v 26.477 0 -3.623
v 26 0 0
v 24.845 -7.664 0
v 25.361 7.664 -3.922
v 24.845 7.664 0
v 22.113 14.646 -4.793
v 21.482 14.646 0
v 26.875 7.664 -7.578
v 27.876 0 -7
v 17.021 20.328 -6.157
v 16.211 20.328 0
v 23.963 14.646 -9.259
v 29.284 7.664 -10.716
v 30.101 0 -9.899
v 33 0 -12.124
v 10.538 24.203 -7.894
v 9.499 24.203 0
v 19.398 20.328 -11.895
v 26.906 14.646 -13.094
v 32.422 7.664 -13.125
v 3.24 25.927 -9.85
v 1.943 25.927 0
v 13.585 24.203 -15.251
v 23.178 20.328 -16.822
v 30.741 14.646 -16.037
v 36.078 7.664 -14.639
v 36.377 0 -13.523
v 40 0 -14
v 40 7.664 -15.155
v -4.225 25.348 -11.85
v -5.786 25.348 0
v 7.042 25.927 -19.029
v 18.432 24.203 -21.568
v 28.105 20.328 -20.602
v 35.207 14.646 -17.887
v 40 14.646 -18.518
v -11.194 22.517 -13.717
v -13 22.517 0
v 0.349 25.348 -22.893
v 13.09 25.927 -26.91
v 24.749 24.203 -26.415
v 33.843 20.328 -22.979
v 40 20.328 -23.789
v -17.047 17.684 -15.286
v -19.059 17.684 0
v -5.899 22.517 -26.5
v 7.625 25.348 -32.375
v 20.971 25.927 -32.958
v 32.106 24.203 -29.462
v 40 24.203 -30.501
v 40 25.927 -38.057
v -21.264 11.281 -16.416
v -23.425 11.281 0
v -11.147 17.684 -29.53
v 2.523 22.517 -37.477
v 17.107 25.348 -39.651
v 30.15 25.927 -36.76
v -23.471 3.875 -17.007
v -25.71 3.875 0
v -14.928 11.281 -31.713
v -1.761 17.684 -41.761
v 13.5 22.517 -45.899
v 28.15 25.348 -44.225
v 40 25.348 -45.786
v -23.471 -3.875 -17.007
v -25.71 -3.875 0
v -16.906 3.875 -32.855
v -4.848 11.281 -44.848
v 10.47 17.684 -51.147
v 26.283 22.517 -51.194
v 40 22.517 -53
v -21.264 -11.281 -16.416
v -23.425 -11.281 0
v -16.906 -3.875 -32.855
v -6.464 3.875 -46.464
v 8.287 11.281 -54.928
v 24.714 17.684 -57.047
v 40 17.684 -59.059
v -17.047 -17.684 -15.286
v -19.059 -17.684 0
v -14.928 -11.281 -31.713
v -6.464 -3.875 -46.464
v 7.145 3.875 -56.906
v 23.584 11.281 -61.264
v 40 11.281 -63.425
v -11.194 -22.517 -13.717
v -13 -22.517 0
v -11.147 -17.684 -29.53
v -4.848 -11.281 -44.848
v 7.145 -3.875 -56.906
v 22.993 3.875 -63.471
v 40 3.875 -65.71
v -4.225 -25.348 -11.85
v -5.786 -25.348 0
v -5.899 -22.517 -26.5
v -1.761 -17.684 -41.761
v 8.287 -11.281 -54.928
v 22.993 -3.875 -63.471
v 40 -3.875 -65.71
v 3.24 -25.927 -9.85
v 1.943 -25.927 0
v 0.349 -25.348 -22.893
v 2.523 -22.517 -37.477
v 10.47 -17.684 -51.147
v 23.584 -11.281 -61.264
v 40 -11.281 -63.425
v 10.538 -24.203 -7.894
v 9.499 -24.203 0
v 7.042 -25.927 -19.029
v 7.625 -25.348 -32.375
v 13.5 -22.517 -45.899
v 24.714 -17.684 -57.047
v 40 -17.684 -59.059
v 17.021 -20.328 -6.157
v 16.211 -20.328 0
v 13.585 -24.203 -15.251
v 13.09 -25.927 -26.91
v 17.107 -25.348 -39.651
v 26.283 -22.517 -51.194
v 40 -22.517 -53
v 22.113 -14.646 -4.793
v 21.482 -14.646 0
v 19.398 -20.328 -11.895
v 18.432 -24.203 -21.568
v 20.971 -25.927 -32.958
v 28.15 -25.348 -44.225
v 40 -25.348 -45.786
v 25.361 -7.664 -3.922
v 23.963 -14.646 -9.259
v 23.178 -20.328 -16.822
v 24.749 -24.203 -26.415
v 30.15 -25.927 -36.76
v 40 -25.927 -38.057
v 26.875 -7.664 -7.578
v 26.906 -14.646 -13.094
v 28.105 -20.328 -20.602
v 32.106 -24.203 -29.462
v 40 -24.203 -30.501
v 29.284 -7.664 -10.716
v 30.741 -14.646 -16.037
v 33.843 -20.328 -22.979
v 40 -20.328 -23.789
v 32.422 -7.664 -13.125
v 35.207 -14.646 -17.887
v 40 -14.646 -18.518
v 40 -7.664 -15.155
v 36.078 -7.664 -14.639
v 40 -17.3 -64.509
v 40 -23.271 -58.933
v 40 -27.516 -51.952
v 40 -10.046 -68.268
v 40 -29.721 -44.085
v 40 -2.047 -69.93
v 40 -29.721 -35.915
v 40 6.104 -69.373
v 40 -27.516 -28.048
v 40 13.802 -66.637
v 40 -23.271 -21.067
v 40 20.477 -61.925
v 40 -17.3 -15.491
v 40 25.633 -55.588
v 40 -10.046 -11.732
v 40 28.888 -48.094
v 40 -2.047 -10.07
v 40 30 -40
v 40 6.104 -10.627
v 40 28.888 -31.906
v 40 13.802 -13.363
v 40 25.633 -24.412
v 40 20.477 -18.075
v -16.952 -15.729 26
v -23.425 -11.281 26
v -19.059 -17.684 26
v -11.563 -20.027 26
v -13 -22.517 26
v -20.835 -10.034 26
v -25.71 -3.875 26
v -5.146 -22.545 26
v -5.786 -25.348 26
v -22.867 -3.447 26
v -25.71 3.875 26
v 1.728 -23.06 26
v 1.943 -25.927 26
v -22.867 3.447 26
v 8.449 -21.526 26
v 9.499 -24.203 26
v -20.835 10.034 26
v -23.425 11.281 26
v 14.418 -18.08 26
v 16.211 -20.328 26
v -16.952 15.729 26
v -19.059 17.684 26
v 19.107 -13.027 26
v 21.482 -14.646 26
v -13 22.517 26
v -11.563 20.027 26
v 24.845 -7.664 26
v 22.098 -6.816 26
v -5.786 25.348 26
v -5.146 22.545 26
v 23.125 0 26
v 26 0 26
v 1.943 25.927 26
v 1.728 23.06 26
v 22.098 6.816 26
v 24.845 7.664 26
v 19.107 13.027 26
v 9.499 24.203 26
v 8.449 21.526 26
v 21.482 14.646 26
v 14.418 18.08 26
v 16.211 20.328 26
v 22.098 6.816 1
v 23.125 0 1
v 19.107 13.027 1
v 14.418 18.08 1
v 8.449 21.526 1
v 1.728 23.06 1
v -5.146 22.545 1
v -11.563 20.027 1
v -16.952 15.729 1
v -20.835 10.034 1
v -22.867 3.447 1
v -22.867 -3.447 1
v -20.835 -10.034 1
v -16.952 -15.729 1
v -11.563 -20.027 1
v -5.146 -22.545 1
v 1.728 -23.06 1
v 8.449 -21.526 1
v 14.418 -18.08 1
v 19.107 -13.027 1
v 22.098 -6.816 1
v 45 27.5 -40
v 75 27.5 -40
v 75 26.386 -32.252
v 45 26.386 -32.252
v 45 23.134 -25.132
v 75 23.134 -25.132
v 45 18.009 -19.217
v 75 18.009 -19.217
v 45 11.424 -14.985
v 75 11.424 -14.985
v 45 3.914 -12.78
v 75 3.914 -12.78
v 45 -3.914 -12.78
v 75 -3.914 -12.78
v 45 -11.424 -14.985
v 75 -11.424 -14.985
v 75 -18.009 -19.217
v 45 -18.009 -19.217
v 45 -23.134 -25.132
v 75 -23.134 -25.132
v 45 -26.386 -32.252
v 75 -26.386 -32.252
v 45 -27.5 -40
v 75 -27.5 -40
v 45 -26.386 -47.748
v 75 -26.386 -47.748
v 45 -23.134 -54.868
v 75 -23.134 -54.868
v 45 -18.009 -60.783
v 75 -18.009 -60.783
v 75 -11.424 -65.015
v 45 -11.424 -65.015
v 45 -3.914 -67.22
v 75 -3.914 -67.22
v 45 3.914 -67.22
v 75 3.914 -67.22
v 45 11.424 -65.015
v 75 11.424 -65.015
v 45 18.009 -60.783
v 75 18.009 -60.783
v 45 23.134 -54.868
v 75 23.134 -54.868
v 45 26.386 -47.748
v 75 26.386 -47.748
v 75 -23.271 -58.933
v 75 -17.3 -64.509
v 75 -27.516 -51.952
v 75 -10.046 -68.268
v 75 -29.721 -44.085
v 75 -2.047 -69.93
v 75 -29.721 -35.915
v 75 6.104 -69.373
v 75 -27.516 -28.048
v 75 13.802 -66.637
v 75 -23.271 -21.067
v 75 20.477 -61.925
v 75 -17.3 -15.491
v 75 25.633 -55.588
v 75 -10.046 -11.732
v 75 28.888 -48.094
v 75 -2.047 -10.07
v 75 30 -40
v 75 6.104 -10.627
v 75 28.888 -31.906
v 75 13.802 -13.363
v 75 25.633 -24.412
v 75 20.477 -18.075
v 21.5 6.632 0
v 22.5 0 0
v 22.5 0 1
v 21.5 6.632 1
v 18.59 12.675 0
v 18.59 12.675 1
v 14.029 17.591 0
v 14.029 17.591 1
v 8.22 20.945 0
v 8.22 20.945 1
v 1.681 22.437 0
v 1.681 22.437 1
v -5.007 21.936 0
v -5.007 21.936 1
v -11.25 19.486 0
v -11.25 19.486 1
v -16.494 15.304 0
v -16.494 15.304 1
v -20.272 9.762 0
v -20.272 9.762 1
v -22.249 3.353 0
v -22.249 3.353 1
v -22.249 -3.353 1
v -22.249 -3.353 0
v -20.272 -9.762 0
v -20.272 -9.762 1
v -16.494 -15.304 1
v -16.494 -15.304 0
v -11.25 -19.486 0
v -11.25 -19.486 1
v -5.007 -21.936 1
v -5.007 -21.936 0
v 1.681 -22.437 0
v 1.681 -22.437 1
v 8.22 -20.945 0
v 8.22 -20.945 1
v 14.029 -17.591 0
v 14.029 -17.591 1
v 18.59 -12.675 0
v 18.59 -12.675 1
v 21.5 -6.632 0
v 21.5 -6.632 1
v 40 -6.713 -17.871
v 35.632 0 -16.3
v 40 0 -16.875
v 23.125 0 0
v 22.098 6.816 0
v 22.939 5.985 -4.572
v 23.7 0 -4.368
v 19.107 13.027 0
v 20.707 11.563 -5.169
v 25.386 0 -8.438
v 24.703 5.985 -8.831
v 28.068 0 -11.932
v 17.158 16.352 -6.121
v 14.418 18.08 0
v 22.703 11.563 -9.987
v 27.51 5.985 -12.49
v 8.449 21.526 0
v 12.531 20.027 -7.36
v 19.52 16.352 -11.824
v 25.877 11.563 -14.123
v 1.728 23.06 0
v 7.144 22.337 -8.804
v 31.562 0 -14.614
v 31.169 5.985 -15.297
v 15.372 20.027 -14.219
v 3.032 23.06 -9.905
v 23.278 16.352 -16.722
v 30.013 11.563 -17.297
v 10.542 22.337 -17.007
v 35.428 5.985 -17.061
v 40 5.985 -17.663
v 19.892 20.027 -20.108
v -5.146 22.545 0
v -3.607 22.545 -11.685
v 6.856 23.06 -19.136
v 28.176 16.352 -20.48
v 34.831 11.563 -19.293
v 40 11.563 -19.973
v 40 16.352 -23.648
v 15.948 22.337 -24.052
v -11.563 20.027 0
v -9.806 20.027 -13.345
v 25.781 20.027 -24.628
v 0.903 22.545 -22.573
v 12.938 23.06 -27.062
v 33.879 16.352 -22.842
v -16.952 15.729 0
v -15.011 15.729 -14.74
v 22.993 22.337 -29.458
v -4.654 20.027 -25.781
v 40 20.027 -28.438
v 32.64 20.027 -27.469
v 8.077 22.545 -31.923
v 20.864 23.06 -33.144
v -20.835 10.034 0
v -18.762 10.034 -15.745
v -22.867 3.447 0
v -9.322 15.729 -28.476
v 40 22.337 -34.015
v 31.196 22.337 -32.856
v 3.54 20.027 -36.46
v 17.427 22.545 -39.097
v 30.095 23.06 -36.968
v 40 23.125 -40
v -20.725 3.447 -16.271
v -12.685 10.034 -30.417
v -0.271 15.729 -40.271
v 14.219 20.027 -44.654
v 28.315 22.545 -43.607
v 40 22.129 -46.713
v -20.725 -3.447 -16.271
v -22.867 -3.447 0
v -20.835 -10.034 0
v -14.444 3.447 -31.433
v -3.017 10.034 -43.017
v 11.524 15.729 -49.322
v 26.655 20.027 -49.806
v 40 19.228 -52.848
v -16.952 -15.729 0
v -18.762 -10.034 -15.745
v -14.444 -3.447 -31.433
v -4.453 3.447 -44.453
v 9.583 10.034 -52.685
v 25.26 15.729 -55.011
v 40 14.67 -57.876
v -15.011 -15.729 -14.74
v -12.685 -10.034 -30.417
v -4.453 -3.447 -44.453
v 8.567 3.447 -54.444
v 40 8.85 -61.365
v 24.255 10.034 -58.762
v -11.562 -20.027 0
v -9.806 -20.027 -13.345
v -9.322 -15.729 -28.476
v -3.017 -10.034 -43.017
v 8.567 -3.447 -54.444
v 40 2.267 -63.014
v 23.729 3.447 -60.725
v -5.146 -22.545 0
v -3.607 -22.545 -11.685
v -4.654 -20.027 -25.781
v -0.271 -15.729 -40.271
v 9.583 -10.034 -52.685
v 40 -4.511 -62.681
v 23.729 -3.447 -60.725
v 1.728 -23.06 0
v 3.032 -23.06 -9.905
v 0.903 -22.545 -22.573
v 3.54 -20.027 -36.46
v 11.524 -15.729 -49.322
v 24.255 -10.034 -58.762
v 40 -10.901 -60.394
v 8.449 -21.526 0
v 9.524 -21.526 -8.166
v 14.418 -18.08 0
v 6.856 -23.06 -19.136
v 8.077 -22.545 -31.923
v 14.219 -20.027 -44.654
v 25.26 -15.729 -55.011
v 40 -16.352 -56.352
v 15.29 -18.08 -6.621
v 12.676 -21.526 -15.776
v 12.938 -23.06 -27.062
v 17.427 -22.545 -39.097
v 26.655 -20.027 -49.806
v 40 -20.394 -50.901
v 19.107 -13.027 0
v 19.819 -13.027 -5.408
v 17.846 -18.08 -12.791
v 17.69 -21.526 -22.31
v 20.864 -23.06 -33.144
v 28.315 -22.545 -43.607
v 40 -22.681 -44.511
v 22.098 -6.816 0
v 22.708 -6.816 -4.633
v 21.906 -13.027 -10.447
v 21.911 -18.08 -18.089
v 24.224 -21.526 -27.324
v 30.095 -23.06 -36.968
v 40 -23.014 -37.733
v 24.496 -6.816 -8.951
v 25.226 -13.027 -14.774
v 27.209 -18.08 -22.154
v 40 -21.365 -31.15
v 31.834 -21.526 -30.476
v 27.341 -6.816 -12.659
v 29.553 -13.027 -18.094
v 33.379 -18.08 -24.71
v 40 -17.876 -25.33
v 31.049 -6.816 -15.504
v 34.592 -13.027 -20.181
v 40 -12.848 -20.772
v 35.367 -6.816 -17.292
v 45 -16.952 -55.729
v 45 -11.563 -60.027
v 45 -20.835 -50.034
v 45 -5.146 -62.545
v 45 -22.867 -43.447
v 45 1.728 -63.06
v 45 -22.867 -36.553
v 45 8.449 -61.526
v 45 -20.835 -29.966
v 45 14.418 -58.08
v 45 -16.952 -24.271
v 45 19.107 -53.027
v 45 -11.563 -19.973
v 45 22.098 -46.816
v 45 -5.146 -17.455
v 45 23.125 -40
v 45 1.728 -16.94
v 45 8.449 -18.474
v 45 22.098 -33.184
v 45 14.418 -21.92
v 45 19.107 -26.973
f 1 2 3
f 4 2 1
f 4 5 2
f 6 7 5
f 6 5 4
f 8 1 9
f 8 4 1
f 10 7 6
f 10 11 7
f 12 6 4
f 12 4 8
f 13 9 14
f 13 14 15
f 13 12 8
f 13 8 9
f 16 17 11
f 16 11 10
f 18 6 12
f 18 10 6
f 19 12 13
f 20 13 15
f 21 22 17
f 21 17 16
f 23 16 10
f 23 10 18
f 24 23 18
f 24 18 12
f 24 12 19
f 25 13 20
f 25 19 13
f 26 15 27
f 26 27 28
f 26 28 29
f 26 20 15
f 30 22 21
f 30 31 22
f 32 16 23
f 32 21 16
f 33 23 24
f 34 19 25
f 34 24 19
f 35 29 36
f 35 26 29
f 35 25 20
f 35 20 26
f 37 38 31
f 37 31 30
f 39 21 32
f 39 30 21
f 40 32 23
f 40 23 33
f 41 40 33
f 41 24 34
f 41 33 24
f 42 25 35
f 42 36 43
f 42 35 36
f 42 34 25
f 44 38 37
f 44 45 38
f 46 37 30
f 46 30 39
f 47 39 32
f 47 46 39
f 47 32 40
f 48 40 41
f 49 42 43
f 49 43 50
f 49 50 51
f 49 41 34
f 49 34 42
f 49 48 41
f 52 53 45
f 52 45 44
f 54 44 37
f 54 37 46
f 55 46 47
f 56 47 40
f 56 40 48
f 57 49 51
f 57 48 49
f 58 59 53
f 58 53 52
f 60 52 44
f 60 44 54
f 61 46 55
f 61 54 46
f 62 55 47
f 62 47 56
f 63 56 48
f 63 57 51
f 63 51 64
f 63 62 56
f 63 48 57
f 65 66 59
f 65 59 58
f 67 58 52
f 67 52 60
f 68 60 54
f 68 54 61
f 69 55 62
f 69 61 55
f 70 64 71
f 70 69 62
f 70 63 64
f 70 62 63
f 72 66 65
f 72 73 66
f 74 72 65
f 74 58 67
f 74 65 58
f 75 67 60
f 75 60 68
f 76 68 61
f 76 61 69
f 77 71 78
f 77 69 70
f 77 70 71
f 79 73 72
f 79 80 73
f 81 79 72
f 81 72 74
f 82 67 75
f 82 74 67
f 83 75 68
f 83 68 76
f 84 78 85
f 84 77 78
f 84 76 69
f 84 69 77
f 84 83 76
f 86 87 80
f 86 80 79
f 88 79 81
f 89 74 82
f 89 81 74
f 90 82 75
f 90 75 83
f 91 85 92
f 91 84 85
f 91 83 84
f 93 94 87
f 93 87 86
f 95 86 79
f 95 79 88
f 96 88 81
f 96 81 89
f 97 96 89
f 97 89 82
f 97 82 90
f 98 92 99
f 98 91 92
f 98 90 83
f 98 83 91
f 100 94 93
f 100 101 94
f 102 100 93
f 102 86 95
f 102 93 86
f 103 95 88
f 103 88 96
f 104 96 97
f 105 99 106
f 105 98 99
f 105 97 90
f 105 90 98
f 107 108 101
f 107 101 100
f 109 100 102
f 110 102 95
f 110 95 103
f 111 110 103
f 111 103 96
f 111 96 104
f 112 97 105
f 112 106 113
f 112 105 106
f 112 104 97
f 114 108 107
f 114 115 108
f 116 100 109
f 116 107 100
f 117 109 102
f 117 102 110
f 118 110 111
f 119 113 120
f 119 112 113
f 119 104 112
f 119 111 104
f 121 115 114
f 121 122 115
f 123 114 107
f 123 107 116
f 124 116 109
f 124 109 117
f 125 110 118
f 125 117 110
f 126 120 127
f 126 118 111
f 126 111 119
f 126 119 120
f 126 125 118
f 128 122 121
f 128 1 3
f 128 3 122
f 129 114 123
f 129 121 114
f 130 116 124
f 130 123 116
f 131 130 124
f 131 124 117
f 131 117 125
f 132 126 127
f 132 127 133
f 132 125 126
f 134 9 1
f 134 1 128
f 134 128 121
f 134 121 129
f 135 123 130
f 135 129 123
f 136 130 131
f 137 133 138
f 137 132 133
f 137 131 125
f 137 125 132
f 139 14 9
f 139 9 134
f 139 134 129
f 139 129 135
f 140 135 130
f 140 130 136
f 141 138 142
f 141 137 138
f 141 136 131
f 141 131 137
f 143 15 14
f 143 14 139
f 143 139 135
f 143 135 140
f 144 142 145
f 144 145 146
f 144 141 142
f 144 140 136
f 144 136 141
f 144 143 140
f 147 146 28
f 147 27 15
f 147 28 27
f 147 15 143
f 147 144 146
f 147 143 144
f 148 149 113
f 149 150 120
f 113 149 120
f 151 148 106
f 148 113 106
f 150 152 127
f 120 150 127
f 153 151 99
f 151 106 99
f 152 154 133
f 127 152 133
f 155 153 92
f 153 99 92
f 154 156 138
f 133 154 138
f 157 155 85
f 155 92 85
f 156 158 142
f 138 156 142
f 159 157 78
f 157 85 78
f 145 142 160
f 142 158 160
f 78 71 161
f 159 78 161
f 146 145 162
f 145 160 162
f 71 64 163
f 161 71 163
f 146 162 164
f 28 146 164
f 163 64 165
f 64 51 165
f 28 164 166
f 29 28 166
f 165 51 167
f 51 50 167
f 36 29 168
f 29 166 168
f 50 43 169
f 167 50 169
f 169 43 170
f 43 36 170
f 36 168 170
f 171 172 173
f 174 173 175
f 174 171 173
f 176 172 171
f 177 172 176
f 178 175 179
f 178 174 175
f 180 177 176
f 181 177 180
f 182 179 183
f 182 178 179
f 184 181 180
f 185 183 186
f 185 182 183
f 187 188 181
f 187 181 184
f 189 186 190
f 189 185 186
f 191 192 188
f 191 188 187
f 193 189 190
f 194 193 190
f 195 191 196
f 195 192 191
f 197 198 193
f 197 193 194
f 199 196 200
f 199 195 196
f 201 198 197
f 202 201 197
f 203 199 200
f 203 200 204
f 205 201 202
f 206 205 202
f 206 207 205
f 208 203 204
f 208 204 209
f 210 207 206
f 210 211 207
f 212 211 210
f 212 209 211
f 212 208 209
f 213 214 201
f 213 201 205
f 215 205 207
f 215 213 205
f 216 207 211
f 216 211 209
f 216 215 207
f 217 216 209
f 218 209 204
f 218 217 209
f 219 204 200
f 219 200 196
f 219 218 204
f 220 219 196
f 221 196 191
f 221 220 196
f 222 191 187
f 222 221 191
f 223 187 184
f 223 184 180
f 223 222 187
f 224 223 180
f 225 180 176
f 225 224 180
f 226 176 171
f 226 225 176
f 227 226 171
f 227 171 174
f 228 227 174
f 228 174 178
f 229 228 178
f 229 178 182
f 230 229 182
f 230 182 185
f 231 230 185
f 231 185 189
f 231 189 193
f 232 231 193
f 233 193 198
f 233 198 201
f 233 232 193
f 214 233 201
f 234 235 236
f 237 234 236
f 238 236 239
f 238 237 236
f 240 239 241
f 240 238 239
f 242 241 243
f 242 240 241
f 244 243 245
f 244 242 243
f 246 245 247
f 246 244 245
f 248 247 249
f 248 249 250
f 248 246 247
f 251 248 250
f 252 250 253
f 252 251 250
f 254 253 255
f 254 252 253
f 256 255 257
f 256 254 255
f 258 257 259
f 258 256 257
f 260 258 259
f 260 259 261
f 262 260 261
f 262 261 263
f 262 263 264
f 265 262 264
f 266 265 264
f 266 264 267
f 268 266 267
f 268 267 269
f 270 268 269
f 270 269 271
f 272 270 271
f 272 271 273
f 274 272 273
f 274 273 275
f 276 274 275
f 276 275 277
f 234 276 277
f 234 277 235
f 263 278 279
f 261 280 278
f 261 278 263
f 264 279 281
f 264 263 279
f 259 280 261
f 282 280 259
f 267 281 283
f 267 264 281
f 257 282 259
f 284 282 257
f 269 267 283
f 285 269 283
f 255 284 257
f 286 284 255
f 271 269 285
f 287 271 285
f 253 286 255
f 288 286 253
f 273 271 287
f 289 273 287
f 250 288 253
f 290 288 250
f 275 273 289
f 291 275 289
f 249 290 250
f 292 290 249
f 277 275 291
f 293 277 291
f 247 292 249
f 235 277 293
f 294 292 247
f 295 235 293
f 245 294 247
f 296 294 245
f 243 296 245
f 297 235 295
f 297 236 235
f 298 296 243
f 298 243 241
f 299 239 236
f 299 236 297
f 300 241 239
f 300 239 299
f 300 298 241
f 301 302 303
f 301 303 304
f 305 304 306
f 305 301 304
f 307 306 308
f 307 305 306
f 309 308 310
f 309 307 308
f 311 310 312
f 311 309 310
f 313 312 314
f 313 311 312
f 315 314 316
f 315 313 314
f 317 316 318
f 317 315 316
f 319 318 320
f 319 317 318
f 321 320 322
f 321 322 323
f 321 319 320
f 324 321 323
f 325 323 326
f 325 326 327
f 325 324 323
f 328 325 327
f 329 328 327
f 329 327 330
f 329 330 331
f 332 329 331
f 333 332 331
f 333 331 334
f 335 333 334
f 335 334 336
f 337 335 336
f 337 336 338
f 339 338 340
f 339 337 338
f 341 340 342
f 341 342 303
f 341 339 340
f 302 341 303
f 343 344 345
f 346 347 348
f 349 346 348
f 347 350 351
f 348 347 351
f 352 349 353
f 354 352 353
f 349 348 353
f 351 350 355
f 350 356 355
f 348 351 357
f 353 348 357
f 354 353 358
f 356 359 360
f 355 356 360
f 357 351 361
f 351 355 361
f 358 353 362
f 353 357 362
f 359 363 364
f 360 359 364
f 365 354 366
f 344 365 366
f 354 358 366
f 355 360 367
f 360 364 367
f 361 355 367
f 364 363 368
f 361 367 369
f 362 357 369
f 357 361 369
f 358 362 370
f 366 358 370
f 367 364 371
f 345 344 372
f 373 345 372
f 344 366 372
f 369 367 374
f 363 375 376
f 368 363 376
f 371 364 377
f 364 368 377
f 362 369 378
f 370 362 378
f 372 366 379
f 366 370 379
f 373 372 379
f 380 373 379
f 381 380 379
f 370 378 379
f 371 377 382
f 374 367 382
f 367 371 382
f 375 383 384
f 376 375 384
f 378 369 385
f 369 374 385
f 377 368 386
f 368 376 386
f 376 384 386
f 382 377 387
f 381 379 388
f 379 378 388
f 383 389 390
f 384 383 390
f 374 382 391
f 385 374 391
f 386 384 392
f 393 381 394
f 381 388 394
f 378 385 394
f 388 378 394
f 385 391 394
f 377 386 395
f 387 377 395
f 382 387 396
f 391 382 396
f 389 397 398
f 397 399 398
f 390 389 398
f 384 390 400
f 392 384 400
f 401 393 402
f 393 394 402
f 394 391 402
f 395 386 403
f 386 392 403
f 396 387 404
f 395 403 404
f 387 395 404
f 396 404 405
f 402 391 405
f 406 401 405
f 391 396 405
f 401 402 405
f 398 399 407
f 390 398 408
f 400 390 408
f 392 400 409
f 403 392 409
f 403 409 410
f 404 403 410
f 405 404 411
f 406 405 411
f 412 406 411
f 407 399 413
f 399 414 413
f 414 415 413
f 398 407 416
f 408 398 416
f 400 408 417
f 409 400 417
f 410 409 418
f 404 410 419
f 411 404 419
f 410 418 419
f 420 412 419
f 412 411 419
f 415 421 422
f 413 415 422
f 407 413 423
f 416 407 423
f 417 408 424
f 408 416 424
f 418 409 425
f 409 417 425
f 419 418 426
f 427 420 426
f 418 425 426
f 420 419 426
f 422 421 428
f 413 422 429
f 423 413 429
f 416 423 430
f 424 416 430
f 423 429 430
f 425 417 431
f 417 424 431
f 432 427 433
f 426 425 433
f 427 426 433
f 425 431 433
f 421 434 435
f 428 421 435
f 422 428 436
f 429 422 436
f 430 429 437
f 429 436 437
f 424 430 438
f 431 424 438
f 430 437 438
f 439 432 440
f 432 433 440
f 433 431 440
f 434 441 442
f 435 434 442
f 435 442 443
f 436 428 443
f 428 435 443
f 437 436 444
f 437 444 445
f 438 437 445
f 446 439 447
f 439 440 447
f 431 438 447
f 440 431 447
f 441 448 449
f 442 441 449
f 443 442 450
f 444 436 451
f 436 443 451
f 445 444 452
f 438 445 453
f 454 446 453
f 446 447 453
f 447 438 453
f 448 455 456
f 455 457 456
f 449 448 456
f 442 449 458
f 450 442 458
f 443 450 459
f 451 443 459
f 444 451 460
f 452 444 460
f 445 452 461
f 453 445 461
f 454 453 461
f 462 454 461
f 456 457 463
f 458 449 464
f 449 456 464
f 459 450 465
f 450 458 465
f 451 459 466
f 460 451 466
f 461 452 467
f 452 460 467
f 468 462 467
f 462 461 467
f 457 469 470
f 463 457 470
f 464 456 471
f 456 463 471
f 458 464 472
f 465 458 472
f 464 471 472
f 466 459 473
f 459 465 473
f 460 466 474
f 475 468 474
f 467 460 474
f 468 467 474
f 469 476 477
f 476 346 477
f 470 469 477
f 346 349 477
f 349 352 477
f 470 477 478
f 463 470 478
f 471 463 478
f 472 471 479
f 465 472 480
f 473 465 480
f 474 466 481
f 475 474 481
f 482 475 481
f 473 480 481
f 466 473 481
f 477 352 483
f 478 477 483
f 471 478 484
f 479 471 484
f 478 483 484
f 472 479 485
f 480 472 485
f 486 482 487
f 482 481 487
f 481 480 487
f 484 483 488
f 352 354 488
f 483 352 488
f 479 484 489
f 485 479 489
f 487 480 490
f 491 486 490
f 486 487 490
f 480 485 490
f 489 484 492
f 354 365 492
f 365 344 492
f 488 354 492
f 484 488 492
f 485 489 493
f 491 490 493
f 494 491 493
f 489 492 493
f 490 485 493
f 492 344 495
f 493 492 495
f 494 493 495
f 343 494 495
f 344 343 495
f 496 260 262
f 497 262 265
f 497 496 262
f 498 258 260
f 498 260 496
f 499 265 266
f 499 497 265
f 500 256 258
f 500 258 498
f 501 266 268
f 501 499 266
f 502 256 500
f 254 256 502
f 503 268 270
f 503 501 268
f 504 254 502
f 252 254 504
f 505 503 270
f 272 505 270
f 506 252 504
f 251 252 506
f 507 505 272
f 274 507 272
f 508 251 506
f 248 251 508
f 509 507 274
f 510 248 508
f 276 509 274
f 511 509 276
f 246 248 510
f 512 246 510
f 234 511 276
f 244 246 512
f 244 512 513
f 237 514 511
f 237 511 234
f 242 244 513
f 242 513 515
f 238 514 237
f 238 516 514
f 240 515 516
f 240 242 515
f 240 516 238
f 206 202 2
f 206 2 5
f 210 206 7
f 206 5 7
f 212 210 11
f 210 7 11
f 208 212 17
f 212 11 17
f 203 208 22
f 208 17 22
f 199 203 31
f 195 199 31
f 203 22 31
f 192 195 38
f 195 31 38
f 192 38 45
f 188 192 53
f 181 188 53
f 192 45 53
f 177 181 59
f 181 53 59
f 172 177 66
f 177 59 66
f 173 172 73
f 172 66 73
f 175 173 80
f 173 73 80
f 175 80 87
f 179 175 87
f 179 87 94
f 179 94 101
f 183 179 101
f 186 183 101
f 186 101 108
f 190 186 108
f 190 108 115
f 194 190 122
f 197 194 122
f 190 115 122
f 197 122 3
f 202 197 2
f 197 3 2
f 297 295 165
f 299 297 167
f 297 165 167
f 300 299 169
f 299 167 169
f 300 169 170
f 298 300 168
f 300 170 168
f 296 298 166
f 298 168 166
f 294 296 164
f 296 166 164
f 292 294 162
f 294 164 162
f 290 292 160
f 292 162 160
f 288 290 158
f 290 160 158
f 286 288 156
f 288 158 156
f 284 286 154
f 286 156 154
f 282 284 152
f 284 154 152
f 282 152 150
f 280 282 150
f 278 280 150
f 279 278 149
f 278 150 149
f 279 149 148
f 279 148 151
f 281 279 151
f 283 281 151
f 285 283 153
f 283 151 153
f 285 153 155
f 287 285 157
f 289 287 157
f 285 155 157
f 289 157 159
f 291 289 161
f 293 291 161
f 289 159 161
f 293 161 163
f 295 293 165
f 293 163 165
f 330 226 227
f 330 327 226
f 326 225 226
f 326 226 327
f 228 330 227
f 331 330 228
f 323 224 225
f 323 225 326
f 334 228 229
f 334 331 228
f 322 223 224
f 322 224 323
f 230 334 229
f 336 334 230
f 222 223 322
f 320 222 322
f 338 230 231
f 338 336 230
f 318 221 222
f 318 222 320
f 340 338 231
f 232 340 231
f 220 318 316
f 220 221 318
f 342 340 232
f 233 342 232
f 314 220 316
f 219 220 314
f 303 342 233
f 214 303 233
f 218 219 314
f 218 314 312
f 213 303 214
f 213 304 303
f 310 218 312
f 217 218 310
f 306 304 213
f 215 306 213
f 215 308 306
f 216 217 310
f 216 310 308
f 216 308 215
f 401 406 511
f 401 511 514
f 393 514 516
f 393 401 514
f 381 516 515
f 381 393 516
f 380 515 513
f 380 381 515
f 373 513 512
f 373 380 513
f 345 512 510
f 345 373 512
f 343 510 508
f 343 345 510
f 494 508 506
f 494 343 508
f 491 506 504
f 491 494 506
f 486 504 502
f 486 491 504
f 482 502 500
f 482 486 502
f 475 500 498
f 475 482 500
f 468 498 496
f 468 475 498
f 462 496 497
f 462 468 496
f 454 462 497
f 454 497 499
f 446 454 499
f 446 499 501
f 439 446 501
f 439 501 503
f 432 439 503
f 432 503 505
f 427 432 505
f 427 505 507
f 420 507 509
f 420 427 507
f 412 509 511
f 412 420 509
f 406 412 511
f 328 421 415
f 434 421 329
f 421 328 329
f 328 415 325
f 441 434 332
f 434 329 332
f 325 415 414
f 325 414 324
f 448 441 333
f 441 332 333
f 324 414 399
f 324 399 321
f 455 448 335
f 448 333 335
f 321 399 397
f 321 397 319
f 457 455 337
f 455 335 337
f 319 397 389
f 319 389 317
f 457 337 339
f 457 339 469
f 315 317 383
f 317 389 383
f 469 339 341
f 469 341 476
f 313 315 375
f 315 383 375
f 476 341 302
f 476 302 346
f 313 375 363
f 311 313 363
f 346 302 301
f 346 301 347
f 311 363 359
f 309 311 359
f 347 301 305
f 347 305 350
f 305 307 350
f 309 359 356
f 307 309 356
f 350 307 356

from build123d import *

# Parameters (mm, degrees)
F0_R     = 26
F0_R_2   = 23.125
F3_R     = 26
F3_R_2   = 23.125
F3_R_3   = 22.5
F4_DEPTH = 1
F5_R     = 26
F5_R_2   = 23.125
F6_DEPTH = 25
F7_R     = 27.5
F7_R_2   = 26
F7_R_3   = 23.125
F8_DEPTH = 5
F7_R_4   = 30
F9_DEPTH = 35


with BuildPart() as f2:
    # F2: sweep along a path in F1
    with BuildLine(Plane.XZ) as f2_path:
        ThreePointArc((0, 0), (11.7157287525, -28.2842712475), (40, -40))
    # F0 (on Top) → F2 (sweep)
    with BuildSketch(Plane.XY):
        Circle(F0_R)
        Circle(F0_R_2, mode=Mode.SUBTRACT)
    sweep(path=f2_path.line)

    # F3 (on face) → F4 (join)
    with BuildSketch(Plane.XY):
        Circle(F3_R)
        Circle(F3_R_2, mode=Mode.SUBTRACT)
        Circle(F3_R_2)
        Circle(F3_R_3, mode=Mode.SUBTRACT)
    extrude(amount=F4_DEPTH)

    # F5 (on face) → F6 (join)
    with BuildSketch(Plane.XY.offset(1)):
        Circle(F5_R)
        Circle(F5_R_2, mode=Mode.SUBTRACT)
    extrude(amount=F6_DEPTH)

    # F7 (on face) → F8 (join)
    with BuildSketch(Plane.YZ.offset(40)):
        with Locations((0, -40)):
            Circle(F7_R)
        with Locations((0, -40)):
            Circle(F7_R_2, mode=Mode.SUBTRACT)
        with Locations((0, -40)):
            Circle(F7_R_2)
        with Locations((0, -40)):
            Circle(F7_R_3, mode=Mode.SUBTRACT)
    extrude(amount=F8_DEPTH)

    # F7 (on face) → F9 (join)
    with BuildSketch(Plane.YZ.offset(40)):
        with Locations((0, -40)):
            Circle(F7_R_4)
        with Locations((0, -40)):
            Circle(F7_R, mode=Mode.SUBTRACT)
    extrude(amount=F9_DEPTH)


solid = f2.part
